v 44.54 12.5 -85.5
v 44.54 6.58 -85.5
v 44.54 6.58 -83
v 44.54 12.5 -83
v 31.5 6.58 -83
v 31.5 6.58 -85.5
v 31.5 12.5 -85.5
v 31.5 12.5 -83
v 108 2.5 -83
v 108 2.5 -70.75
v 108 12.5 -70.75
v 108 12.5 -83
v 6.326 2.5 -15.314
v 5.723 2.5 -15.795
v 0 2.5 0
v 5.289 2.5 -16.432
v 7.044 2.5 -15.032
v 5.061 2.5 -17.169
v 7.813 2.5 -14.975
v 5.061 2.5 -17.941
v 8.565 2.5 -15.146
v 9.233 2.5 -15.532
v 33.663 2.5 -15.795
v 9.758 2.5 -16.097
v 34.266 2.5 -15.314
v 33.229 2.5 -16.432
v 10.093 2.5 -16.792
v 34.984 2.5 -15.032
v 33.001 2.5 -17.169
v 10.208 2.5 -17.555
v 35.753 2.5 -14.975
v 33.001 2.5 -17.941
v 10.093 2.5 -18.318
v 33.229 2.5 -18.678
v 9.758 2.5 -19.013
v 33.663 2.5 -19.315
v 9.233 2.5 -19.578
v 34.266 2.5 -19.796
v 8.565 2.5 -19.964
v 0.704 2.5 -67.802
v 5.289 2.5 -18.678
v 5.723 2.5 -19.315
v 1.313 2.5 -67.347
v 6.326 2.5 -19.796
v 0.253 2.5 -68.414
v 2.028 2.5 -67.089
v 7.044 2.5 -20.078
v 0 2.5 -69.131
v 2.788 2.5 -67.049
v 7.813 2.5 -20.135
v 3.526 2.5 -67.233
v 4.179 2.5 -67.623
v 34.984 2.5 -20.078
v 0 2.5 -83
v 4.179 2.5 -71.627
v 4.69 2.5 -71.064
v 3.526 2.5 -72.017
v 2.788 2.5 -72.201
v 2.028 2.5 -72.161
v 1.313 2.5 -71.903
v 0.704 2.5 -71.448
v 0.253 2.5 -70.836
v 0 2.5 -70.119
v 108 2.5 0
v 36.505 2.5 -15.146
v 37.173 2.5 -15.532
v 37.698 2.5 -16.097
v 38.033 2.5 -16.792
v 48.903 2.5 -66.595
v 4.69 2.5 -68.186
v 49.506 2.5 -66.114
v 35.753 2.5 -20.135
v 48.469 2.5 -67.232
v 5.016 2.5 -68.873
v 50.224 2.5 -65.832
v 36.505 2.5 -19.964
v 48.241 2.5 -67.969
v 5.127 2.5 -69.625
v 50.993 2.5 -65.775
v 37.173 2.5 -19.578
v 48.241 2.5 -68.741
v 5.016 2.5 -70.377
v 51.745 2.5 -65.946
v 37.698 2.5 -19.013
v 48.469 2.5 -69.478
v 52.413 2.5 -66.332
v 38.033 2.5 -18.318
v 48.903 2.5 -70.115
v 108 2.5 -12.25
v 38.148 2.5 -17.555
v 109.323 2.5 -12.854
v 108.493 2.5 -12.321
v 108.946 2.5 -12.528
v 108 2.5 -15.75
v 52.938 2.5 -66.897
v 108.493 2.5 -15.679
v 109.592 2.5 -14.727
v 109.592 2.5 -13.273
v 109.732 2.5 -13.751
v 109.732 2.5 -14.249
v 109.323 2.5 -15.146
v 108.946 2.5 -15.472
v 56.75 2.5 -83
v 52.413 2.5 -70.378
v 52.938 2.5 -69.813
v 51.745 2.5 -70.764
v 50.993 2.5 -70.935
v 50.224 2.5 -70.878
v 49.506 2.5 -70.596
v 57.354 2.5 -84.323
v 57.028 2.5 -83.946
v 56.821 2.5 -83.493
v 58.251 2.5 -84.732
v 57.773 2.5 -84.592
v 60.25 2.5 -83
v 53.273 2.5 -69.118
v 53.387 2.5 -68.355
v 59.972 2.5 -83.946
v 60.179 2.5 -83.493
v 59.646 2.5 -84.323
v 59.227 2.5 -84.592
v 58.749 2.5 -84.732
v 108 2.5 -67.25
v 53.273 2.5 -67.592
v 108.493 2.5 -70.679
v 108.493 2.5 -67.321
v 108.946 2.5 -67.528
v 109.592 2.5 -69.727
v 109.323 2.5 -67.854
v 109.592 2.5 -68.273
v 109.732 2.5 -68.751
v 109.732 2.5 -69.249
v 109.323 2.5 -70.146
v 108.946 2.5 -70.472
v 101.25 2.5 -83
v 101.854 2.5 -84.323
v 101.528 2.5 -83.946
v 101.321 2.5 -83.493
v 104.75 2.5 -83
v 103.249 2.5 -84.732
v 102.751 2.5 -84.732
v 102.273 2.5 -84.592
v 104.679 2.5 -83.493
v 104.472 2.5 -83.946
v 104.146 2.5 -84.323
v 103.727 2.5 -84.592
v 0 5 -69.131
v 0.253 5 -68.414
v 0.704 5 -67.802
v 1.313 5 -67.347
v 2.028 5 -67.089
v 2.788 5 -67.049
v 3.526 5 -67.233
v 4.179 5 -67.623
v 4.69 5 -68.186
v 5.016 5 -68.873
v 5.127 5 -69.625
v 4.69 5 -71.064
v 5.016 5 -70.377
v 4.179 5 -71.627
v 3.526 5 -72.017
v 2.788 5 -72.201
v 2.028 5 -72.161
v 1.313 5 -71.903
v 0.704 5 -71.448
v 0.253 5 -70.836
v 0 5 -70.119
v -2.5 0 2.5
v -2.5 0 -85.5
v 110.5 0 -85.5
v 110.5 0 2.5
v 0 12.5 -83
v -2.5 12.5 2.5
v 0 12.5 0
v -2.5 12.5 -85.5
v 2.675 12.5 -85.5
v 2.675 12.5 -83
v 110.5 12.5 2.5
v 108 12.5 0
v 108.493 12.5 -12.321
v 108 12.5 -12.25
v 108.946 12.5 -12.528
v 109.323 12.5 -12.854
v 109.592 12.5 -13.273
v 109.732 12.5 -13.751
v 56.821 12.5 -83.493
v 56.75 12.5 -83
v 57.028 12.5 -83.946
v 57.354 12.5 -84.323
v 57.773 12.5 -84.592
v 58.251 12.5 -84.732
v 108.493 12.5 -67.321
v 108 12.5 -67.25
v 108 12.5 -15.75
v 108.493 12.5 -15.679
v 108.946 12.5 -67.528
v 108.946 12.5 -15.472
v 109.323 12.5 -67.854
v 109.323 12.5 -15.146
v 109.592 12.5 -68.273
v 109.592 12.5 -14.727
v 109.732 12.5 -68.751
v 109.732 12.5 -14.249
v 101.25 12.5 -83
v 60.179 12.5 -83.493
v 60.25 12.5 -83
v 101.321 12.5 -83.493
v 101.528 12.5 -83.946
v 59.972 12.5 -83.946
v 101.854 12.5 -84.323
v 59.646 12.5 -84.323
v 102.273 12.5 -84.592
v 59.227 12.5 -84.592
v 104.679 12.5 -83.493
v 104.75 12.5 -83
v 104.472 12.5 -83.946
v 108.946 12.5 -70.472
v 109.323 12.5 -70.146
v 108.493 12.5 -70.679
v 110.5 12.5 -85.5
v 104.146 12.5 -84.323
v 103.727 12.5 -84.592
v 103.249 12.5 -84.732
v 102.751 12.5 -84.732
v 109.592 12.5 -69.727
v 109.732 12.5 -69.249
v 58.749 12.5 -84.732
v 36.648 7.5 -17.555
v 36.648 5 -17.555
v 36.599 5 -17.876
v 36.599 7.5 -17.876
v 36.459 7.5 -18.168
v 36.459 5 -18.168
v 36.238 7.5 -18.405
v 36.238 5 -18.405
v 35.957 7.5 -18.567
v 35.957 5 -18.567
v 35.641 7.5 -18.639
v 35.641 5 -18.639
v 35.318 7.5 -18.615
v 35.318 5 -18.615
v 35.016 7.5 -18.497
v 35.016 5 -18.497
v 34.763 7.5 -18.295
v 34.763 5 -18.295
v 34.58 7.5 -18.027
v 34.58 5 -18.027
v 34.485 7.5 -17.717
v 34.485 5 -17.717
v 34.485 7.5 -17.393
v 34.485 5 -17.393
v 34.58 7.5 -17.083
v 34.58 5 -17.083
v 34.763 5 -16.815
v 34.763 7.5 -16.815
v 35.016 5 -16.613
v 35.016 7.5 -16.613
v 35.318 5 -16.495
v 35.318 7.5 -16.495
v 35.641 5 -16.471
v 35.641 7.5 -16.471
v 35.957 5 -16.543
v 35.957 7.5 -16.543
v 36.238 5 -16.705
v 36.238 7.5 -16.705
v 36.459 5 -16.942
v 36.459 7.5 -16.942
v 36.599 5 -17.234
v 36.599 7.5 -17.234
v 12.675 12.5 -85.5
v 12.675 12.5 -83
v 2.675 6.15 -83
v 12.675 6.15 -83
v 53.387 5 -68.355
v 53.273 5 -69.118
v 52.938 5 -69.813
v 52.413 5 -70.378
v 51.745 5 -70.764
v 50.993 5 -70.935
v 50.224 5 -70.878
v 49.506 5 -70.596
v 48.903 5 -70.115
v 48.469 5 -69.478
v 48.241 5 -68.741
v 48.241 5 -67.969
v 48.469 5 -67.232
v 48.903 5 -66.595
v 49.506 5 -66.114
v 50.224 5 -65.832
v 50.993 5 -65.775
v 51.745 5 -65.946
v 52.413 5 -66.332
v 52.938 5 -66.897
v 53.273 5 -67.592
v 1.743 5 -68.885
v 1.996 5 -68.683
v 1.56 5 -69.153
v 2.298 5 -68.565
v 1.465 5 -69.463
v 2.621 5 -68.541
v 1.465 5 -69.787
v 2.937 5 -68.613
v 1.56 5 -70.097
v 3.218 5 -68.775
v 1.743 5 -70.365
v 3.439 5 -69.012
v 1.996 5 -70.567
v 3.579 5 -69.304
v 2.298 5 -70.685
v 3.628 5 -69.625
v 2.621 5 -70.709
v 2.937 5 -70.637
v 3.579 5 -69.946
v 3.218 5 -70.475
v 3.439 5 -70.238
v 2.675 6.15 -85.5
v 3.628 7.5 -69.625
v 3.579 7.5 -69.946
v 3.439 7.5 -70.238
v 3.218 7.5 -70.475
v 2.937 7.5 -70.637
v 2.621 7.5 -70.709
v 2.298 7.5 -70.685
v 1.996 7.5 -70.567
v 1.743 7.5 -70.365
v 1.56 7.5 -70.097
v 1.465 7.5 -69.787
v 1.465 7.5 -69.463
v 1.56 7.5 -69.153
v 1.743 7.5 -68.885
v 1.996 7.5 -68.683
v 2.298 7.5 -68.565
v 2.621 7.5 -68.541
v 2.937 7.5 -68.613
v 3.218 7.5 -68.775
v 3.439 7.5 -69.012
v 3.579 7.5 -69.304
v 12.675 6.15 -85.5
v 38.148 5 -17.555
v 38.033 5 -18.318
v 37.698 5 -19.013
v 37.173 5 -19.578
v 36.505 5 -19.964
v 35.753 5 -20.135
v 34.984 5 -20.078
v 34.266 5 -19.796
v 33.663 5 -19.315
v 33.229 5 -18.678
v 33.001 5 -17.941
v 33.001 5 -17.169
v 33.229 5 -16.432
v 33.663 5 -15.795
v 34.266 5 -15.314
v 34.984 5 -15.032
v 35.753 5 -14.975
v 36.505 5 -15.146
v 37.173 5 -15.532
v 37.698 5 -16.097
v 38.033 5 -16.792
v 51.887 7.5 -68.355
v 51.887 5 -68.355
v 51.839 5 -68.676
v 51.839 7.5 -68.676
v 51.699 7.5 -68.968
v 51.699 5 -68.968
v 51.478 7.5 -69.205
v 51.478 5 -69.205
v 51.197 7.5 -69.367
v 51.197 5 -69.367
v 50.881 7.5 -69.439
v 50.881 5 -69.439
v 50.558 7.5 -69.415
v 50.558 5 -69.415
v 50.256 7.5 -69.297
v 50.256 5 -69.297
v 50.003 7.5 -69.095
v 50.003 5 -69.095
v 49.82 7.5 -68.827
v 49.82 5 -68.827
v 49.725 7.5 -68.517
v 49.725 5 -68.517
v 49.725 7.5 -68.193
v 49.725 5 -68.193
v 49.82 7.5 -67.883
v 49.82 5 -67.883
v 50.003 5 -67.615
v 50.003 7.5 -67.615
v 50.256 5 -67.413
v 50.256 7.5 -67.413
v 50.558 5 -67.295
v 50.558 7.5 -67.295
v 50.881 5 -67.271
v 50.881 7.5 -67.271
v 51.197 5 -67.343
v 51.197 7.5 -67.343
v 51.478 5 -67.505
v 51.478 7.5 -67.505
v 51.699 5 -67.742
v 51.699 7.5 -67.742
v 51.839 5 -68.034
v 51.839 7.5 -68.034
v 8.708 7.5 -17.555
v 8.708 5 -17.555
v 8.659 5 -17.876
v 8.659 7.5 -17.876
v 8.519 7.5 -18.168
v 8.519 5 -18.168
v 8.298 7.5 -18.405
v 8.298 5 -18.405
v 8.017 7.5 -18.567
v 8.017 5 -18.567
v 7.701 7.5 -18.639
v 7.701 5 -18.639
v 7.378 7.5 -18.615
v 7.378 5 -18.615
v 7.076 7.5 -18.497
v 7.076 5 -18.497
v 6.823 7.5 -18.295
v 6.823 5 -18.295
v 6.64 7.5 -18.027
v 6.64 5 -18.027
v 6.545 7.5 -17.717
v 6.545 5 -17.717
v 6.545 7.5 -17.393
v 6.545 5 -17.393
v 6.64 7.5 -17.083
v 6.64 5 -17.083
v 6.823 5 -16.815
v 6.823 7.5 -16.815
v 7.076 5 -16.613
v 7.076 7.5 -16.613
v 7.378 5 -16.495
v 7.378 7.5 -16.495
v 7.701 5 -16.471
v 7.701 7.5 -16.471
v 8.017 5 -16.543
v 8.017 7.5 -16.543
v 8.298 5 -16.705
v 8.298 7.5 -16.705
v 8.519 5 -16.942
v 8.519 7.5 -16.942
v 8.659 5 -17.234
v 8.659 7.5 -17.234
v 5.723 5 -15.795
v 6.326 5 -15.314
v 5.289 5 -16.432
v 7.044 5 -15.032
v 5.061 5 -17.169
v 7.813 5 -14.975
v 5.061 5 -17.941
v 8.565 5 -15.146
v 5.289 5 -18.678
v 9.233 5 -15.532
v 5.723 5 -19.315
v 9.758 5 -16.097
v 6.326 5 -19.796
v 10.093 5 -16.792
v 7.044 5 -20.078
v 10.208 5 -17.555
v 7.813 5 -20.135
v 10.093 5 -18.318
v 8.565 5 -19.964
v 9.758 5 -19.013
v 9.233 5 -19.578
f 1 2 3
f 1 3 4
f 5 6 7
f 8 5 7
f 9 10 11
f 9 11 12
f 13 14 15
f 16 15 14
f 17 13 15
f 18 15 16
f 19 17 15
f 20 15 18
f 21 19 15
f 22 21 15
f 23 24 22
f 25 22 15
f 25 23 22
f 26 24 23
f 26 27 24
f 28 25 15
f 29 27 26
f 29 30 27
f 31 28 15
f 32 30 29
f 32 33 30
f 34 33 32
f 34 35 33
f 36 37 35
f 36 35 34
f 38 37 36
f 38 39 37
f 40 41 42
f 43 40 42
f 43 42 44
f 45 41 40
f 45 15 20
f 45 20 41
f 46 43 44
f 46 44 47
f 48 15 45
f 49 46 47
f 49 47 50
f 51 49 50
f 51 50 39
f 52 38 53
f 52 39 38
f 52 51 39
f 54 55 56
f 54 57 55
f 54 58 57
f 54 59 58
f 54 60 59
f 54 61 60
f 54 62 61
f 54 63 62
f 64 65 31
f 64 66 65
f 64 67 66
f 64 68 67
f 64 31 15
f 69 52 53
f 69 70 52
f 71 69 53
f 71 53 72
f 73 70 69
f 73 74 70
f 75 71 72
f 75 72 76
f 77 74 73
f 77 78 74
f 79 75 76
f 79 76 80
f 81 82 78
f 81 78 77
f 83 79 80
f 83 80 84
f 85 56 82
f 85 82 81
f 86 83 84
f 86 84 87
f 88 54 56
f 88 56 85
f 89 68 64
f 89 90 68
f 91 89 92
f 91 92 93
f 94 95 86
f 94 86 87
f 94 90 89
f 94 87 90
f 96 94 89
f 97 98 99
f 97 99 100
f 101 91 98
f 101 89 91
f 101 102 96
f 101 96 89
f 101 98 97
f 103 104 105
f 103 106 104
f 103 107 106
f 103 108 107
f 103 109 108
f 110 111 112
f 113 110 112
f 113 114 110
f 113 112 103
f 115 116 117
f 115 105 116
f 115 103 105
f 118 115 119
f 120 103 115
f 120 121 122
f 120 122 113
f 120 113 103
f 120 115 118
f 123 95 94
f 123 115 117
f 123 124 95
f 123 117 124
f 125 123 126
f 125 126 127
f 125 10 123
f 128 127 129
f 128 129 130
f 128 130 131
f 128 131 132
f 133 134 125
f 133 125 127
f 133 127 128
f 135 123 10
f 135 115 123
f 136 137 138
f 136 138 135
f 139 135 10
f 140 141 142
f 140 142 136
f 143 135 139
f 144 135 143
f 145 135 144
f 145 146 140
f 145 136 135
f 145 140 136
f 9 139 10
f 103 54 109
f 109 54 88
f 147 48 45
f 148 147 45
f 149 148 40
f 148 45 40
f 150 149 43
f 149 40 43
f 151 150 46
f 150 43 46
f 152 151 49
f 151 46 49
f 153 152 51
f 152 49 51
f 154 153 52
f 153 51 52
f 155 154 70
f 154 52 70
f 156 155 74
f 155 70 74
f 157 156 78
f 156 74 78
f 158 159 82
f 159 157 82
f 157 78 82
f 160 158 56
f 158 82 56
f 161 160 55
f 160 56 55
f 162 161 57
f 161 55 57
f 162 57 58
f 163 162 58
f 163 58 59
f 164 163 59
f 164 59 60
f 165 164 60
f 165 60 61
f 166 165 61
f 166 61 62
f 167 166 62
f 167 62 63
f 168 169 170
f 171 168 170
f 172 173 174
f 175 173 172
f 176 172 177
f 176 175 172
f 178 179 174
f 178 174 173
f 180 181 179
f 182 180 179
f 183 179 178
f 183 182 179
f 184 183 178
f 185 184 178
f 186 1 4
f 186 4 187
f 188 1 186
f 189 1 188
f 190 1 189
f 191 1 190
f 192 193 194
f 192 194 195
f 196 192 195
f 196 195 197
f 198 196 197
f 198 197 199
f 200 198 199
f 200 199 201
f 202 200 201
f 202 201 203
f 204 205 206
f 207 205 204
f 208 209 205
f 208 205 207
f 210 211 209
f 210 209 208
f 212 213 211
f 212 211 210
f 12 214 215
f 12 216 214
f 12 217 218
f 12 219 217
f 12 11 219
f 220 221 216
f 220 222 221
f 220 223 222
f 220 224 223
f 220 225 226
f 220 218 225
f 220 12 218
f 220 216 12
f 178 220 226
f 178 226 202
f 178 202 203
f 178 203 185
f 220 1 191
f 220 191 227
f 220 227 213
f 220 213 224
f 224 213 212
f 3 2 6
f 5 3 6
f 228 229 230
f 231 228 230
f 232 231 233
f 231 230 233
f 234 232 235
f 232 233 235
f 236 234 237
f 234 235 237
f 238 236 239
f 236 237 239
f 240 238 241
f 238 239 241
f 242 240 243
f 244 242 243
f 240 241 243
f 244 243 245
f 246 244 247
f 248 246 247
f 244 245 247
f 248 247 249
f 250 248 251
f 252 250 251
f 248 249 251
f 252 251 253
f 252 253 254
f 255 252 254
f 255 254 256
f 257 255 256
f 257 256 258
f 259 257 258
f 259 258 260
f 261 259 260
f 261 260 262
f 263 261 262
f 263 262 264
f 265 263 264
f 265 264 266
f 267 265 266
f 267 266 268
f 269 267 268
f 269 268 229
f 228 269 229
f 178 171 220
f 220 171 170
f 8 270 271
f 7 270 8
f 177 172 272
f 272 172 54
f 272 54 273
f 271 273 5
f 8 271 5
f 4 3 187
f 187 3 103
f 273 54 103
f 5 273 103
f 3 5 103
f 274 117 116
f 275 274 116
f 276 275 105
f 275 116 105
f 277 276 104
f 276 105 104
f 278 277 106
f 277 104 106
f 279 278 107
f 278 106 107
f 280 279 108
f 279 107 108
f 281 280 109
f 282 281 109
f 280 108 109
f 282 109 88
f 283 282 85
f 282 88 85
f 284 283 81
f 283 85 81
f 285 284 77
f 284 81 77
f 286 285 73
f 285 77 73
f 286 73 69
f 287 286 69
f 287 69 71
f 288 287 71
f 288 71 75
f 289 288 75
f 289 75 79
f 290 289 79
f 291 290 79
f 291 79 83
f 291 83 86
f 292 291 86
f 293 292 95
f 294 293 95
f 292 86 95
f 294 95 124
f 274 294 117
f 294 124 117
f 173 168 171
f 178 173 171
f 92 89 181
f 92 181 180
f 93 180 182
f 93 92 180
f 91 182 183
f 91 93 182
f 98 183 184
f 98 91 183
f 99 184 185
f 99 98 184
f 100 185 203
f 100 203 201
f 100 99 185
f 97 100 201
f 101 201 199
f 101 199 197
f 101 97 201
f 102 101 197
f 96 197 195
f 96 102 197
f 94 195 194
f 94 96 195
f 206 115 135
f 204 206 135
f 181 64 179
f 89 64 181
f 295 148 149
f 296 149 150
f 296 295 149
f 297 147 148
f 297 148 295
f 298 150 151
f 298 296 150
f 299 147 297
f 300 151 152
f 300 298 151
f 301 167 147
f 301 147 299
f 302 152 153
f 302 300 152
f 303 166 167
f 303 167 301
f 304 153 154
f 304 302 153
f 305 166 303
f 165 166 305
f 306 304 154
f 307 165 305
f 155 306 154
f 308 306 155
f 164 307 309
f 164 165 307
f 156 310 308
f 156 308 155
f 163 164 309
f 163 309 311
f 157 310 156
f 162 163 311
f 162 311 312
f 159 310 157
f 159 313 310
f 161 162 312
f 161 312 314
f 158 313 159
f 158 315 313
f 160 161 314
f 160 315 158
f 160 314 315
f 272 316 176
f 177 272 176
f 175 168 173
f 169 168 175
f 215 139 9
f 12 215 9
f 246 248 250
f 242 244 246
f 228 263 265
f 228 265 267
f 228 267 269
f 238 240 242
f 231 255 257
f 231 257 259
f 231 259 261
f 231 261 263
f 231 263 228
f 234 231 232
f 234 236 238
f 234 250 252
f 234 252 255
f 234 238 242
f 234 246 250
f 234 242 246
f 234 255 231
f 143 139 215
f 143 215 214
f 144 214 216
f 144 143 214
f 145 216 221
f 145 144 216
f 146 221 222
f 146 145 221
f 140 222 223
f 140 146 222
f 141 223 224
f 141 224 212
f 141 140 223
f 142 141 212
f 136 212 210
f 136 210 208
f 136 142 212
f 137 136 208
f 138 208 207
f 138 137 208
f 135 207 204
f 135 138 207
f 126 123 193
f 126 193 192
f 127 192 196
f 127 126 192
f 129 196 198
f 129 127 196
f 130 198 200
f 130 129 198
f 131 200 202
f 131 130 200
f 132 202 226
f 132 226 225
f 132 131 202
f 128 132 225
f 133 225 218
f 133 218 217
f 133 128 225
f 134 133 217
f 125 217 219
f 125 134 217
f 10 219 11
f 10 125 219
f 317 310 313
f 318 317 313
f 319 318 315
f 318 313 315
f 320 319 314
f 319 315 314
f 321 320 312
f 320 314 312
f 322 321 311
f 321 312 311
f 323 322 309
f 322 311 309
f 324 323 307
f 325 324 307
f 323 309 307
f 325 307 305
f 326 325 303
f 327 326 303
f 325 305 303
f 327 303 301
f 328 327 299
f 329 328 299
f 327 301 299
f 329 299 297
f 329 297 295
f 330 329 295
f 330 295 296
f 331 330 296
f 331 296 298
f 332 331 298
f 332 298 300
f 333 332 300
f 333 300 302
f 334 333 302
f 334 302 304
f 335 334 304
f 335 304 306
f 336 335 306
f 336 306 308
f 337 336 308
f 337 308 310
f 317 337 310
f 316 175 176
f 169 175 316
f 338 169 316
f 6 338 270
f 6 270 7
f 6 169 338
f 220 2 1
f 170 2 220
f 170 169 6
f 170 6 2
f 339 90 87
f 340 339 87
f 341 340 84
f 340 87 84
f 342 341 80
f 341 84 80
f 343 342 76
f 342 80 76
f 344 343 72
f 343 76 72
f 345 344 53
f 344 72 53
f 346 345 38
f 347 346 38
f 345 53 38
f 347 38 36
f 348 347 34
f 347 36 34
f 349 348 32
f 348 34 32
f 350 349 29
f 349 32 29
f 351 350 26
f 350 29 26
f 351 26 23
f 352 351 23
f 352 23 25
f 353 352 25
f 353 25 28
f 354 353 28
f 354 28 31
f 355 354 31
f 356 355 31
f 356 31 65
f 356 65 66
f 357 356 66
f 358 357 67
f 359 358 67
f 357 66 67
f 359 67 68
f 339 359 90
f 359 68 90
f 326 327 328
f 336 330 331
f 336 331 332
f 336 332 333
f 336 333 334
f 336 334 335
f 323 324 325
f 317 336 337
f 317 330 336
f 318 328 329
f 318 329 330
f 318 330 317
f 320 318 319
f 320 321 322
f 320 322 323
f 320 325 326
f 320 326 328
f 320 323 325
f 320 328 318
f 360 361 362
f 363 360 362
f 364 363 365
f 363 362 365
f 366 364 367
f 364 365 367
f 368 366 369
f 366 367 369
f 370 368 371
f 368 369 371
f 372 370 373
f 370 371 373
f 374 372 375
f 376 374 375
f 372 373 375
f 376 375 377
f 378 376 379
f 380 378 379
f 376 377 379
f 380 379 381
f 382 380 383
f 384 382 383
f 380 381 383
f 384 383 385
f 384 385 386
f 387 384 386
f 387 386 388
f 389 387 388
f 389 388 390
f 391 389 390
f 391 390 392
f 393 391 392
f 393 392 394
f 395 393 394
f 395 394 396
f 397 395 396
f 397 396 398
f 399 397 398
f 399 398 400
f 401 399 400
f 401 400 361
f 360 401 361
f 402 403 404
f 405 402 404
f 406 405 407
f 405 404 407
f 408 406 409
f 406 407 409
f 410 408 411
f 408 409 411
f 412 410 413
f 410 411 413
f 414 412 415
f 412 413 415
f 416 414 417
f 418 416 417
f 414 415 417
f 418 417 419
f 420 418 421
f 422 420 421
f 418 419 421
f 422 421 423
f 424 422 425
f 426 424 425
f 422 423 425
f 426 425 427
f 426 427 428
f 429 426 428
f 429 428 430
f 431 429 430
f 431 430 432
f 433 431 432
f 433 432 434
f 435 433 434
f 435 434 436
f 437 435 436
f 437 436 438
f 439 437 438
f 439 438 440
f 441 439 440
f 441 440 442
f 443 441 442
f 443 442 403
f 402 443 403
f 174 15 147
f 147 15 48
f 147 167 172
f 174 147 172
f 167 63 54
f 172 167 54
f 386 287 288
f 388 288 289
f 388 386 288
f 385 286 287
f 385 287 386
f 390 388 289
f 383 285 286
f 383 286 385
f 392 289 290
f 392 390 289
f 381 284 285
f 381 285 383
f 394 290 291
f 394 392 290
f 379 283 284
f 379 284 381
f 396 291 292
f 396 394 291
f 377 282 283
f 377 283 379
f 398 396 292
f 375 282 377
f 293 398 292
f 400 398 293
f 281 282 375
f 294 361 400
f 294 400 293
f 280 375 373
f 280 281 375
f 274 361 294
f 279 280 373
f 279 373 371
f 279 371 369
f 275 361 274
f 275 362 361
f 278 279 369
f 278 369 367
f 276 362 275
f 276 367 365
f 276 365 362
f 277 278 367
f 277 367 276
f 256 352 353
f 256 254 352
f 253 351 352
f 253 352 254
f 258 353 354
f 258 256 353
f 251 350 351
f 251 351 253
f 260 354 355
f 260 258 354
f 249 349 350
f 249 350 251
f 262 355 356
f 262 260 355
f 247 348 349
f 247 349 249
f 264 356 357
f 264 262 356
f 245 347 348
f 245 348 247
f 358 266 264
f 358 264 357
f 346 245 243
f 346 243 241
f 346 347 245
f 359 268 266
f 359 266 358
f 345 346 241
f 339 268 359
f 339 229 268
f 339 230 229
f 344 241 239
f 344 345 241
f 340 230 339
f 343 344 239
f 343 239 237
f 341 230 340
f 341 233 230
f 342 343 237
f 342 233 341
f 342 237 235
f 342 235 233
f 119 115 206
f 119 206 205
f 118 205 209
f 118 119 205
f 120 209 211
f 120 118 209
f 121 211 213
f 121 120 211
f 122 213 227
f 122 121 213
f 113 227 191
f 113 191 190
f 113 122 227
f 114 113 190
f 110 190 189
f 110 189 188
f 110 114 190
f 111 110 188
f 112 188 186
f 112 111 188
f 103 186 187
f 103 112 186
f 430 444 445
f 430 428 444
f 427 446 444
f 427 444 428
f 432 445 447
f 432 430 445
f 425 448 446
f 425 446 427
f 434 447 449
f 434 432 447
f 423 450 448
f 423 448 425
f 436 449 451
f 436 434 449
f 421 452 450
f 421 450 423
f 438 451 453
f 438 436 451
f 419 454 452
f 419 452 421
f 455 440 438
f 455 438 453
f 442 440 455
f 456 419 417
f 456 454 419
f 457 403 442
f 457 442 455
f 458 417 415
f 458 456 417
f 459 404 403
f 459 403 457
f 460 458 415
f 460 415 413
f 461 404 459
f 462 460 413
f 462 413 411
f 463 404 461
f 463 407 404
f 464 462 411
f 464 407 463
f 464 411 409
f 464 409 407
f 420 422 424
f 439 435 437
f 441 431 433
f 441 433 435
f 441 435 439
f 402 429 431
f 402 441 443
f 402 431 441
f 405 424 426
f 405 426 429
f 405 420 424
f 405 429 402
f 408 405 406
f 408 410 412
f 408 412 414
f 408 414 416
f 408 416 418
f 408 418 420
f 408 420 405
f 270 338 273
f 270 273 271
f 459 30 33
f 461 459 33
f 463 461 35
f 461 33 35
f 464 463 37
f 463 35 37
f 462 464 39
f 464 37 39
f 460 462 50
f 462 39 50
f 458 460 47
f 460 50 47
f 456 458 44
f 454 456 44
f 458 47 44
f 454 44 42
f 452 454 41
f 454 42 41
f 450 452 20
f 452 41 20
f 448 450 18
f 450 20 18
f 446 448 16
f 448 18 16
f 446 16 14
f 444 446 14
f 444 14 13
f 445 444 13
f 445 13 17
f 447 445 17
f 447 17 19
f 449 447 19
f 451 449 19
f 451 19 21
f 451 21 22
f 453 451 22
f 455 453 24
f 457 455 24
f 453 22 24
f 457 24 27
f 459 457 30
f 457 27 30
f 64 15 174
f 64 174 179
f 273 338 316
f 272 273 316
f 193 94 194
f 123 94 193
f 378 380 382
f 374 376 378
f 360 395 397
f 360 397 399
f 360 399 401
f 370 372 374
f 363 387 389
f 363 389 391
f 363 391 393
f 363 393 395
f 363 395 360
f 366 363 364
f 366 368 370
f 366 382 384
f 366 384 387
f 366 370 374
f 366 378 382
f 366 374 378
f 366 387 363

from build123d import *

# Parameters (mm, degrees)
SKETCH1_W           = 113
SKETCH1_H           = 88
BOSS_EXTRUDE1_DEPTH = 2.5
SKETCH1_3_W         = 113
SKETCH1_3_H         = 88
SKETCH1_3_W_2       = 108
SKETCH1_3_H_2       = 83
BOSS_EXTRUDE2_DEPTH = 12.5
CUT_EXTRUDE4_REACH  = 90
SKETCH2_W           = 13.04
SKETCH2_H           = 5.92
SKETCH2_W_2         = 10
SKETCH2_H_2         = 6.35
SKETCH4_R           = 2.5875
BOSS_EXTRUDE5_DEPTH = 2.5
SKETCH4_4_R         = 1.0875
BOSS_EXTRUDE6_DEPTH = 5
CUT_EXTRUDE5_START  = -10
CUT_EXTRUDE5_DEPTH  = 10


with BuildPart() as part:
    # Sketch1 → Boss-Extrude1 (new body)
    with BuildSketch(Plane(origin=(0, 0, 0), x_dir=(1, 0, 0), z_dir=(0, 1, 0))):
        with Locations((54, 41.5)):
            Rectangle(SKETCH1_W, SKETCH1_H)
    extrude(amount=BOSS_EXTRUDE1_DEPTH)

    # Sketch1<3> → Boss-Extrude2 (add)
    with BuildSketch(Plane(origin=(0, 0, 0), x_dir=(1, 0, 0), z_dir=(0, 1, 0))):
        with Locations((54, 41.5)):
            Rectangle(SKETCH1_3_W, SKETCH1_3_H)
        with Locations((54, 41.5)):
            Rectangle(SKETCH1_3_W_2, SKETCH1_3_H_2, mode=Mode.SUBTRACT)
    extrude(amount=BOSS_EXTRUDE2_DEPTH)

    # Sketch2 → Cut-Extrude4 (cut, up to next)
    with BuildSketch(Plane(origin=(0, 0, -85.5), x_dir=(-1, 0, 0), z_dir=(0, 0, -1)), mode=Mode.PRIVATE) as cut_extrude4_sk1:
        with Locations((-38.02, 9.54)):
            Rectangle(SKETCH2_W, SKETCH2_H)
    cut_extrude4_tool1 = extrude(cut_extrude4_sk1.sketch, amount=-CUT_EXTRUDE4_REACH, mode=Mode.PRIVATE) & part.part
    add(cut_extrude4_tool1.solids().sort_by_distance((38.02, 9.54, -85.5))[0], mode=Mode.SUBTRACT)
    # Sketch2 → Cut-Extrude4 (cut, up to next)
    with BuildSketch(Plane(origin=(0, 0, -85.5), x_dir=(-1, 0, 0), z_dir=(0, 0, -1)), mode=Mode.PRIVATE) as cut_extrude4_sk2:
        with Locations((-7.675, 9.325)):
            Rectangle(SKETCH2_W_2, SKETCH2_H_2)
    cut_extrude4_tool2 = extrude(cut_extrude4_sk2.sketch, amount=-CUT_EXTRUDE4_REACH, mode=Mode.PRIVATE) & part.part
    add(cut_extrude4_tool2.solids().sort_by_distance((7.675, 9.325, -85.5))[0], mode=Mode.SUBTRACT)

    # Sketch4 → Boss-Extrude5 (add)
    with BuildSketch(Plane(origin=(0, 2.5, 0), x_dir=(1, 0, 0), z_dir=(0, 1, 0))):
        with Locations((2.54, 69.625)):
            Circle(SKETCH4_R)
        with Locations((50.8, 68.355)):
            Circle(SKETCH4_R)
        with Locations((7.62, 17.555)):
            Circle(SKETCH4_R)
        with Locations((35.56, 17.555)):
            Circle(SKETCH4_R)
    extrude(amount=BOSS_EXTRUDE5_DEPTH)

    # Sketch4<4> → Boss-Extrude6 (add)
    with BuildSketch(Plane(origin=(0, 2.5, 0), x_dir=(1, 0, 0), z_dir=(0, 1, 0))):
        with Locations((2.54, 69.625)):
            Circle(SKETCH4_4_R)
        with Locations((50.8, 68.355)):
            Circle(SKETCH4_4_R)
        with Locations((7.62, 17.555)):
            Circle(SKETCH4_4_R)
        with Locations((35.56, 17.555)):
            Circle(SKETCH4_4_R)
    extrude(amount=BOSS_EXTRUDE6_DEPTH)

    # Sketch5 → Cut-Extrude5 (cut)
    with BuildSketch(Plane(origin=(0, 12.5, 0), x_dir=(1, 0, 0), z_dir=(0, 1, 0)).offset(CUT_EXTRUDE5_START)):
        with BuildLine():
            Line((101.25, 83), (104.75, 83))
            ThreePointArc((104.75, 83), (103, 84.75), (101.25, 83))
        make_face()
        with BuildLine():
            Line((56.75, 83), (60.25, 83))
            ThreePointArc((60.25, 83), (58.5, 84.75), (56.75, 83))
        make_face()
        with BuildLine():
            Line((108, 70.75), (108, 67.25))
            ThreePointArc((108, 67.25), (109.75, 69), (108, 70.75))
        make_face()
        with BuildLine():
            Line((108, 15.75), (108, 12.25))
            ThreePointArc((108, 12.25), (109.75, 14), (108, 15.75))
        make_face()
    extrude(amount=CUT_EXTRUDE5_DEPTH, mode=Mode.SUBTRACT)


solid = part.part
